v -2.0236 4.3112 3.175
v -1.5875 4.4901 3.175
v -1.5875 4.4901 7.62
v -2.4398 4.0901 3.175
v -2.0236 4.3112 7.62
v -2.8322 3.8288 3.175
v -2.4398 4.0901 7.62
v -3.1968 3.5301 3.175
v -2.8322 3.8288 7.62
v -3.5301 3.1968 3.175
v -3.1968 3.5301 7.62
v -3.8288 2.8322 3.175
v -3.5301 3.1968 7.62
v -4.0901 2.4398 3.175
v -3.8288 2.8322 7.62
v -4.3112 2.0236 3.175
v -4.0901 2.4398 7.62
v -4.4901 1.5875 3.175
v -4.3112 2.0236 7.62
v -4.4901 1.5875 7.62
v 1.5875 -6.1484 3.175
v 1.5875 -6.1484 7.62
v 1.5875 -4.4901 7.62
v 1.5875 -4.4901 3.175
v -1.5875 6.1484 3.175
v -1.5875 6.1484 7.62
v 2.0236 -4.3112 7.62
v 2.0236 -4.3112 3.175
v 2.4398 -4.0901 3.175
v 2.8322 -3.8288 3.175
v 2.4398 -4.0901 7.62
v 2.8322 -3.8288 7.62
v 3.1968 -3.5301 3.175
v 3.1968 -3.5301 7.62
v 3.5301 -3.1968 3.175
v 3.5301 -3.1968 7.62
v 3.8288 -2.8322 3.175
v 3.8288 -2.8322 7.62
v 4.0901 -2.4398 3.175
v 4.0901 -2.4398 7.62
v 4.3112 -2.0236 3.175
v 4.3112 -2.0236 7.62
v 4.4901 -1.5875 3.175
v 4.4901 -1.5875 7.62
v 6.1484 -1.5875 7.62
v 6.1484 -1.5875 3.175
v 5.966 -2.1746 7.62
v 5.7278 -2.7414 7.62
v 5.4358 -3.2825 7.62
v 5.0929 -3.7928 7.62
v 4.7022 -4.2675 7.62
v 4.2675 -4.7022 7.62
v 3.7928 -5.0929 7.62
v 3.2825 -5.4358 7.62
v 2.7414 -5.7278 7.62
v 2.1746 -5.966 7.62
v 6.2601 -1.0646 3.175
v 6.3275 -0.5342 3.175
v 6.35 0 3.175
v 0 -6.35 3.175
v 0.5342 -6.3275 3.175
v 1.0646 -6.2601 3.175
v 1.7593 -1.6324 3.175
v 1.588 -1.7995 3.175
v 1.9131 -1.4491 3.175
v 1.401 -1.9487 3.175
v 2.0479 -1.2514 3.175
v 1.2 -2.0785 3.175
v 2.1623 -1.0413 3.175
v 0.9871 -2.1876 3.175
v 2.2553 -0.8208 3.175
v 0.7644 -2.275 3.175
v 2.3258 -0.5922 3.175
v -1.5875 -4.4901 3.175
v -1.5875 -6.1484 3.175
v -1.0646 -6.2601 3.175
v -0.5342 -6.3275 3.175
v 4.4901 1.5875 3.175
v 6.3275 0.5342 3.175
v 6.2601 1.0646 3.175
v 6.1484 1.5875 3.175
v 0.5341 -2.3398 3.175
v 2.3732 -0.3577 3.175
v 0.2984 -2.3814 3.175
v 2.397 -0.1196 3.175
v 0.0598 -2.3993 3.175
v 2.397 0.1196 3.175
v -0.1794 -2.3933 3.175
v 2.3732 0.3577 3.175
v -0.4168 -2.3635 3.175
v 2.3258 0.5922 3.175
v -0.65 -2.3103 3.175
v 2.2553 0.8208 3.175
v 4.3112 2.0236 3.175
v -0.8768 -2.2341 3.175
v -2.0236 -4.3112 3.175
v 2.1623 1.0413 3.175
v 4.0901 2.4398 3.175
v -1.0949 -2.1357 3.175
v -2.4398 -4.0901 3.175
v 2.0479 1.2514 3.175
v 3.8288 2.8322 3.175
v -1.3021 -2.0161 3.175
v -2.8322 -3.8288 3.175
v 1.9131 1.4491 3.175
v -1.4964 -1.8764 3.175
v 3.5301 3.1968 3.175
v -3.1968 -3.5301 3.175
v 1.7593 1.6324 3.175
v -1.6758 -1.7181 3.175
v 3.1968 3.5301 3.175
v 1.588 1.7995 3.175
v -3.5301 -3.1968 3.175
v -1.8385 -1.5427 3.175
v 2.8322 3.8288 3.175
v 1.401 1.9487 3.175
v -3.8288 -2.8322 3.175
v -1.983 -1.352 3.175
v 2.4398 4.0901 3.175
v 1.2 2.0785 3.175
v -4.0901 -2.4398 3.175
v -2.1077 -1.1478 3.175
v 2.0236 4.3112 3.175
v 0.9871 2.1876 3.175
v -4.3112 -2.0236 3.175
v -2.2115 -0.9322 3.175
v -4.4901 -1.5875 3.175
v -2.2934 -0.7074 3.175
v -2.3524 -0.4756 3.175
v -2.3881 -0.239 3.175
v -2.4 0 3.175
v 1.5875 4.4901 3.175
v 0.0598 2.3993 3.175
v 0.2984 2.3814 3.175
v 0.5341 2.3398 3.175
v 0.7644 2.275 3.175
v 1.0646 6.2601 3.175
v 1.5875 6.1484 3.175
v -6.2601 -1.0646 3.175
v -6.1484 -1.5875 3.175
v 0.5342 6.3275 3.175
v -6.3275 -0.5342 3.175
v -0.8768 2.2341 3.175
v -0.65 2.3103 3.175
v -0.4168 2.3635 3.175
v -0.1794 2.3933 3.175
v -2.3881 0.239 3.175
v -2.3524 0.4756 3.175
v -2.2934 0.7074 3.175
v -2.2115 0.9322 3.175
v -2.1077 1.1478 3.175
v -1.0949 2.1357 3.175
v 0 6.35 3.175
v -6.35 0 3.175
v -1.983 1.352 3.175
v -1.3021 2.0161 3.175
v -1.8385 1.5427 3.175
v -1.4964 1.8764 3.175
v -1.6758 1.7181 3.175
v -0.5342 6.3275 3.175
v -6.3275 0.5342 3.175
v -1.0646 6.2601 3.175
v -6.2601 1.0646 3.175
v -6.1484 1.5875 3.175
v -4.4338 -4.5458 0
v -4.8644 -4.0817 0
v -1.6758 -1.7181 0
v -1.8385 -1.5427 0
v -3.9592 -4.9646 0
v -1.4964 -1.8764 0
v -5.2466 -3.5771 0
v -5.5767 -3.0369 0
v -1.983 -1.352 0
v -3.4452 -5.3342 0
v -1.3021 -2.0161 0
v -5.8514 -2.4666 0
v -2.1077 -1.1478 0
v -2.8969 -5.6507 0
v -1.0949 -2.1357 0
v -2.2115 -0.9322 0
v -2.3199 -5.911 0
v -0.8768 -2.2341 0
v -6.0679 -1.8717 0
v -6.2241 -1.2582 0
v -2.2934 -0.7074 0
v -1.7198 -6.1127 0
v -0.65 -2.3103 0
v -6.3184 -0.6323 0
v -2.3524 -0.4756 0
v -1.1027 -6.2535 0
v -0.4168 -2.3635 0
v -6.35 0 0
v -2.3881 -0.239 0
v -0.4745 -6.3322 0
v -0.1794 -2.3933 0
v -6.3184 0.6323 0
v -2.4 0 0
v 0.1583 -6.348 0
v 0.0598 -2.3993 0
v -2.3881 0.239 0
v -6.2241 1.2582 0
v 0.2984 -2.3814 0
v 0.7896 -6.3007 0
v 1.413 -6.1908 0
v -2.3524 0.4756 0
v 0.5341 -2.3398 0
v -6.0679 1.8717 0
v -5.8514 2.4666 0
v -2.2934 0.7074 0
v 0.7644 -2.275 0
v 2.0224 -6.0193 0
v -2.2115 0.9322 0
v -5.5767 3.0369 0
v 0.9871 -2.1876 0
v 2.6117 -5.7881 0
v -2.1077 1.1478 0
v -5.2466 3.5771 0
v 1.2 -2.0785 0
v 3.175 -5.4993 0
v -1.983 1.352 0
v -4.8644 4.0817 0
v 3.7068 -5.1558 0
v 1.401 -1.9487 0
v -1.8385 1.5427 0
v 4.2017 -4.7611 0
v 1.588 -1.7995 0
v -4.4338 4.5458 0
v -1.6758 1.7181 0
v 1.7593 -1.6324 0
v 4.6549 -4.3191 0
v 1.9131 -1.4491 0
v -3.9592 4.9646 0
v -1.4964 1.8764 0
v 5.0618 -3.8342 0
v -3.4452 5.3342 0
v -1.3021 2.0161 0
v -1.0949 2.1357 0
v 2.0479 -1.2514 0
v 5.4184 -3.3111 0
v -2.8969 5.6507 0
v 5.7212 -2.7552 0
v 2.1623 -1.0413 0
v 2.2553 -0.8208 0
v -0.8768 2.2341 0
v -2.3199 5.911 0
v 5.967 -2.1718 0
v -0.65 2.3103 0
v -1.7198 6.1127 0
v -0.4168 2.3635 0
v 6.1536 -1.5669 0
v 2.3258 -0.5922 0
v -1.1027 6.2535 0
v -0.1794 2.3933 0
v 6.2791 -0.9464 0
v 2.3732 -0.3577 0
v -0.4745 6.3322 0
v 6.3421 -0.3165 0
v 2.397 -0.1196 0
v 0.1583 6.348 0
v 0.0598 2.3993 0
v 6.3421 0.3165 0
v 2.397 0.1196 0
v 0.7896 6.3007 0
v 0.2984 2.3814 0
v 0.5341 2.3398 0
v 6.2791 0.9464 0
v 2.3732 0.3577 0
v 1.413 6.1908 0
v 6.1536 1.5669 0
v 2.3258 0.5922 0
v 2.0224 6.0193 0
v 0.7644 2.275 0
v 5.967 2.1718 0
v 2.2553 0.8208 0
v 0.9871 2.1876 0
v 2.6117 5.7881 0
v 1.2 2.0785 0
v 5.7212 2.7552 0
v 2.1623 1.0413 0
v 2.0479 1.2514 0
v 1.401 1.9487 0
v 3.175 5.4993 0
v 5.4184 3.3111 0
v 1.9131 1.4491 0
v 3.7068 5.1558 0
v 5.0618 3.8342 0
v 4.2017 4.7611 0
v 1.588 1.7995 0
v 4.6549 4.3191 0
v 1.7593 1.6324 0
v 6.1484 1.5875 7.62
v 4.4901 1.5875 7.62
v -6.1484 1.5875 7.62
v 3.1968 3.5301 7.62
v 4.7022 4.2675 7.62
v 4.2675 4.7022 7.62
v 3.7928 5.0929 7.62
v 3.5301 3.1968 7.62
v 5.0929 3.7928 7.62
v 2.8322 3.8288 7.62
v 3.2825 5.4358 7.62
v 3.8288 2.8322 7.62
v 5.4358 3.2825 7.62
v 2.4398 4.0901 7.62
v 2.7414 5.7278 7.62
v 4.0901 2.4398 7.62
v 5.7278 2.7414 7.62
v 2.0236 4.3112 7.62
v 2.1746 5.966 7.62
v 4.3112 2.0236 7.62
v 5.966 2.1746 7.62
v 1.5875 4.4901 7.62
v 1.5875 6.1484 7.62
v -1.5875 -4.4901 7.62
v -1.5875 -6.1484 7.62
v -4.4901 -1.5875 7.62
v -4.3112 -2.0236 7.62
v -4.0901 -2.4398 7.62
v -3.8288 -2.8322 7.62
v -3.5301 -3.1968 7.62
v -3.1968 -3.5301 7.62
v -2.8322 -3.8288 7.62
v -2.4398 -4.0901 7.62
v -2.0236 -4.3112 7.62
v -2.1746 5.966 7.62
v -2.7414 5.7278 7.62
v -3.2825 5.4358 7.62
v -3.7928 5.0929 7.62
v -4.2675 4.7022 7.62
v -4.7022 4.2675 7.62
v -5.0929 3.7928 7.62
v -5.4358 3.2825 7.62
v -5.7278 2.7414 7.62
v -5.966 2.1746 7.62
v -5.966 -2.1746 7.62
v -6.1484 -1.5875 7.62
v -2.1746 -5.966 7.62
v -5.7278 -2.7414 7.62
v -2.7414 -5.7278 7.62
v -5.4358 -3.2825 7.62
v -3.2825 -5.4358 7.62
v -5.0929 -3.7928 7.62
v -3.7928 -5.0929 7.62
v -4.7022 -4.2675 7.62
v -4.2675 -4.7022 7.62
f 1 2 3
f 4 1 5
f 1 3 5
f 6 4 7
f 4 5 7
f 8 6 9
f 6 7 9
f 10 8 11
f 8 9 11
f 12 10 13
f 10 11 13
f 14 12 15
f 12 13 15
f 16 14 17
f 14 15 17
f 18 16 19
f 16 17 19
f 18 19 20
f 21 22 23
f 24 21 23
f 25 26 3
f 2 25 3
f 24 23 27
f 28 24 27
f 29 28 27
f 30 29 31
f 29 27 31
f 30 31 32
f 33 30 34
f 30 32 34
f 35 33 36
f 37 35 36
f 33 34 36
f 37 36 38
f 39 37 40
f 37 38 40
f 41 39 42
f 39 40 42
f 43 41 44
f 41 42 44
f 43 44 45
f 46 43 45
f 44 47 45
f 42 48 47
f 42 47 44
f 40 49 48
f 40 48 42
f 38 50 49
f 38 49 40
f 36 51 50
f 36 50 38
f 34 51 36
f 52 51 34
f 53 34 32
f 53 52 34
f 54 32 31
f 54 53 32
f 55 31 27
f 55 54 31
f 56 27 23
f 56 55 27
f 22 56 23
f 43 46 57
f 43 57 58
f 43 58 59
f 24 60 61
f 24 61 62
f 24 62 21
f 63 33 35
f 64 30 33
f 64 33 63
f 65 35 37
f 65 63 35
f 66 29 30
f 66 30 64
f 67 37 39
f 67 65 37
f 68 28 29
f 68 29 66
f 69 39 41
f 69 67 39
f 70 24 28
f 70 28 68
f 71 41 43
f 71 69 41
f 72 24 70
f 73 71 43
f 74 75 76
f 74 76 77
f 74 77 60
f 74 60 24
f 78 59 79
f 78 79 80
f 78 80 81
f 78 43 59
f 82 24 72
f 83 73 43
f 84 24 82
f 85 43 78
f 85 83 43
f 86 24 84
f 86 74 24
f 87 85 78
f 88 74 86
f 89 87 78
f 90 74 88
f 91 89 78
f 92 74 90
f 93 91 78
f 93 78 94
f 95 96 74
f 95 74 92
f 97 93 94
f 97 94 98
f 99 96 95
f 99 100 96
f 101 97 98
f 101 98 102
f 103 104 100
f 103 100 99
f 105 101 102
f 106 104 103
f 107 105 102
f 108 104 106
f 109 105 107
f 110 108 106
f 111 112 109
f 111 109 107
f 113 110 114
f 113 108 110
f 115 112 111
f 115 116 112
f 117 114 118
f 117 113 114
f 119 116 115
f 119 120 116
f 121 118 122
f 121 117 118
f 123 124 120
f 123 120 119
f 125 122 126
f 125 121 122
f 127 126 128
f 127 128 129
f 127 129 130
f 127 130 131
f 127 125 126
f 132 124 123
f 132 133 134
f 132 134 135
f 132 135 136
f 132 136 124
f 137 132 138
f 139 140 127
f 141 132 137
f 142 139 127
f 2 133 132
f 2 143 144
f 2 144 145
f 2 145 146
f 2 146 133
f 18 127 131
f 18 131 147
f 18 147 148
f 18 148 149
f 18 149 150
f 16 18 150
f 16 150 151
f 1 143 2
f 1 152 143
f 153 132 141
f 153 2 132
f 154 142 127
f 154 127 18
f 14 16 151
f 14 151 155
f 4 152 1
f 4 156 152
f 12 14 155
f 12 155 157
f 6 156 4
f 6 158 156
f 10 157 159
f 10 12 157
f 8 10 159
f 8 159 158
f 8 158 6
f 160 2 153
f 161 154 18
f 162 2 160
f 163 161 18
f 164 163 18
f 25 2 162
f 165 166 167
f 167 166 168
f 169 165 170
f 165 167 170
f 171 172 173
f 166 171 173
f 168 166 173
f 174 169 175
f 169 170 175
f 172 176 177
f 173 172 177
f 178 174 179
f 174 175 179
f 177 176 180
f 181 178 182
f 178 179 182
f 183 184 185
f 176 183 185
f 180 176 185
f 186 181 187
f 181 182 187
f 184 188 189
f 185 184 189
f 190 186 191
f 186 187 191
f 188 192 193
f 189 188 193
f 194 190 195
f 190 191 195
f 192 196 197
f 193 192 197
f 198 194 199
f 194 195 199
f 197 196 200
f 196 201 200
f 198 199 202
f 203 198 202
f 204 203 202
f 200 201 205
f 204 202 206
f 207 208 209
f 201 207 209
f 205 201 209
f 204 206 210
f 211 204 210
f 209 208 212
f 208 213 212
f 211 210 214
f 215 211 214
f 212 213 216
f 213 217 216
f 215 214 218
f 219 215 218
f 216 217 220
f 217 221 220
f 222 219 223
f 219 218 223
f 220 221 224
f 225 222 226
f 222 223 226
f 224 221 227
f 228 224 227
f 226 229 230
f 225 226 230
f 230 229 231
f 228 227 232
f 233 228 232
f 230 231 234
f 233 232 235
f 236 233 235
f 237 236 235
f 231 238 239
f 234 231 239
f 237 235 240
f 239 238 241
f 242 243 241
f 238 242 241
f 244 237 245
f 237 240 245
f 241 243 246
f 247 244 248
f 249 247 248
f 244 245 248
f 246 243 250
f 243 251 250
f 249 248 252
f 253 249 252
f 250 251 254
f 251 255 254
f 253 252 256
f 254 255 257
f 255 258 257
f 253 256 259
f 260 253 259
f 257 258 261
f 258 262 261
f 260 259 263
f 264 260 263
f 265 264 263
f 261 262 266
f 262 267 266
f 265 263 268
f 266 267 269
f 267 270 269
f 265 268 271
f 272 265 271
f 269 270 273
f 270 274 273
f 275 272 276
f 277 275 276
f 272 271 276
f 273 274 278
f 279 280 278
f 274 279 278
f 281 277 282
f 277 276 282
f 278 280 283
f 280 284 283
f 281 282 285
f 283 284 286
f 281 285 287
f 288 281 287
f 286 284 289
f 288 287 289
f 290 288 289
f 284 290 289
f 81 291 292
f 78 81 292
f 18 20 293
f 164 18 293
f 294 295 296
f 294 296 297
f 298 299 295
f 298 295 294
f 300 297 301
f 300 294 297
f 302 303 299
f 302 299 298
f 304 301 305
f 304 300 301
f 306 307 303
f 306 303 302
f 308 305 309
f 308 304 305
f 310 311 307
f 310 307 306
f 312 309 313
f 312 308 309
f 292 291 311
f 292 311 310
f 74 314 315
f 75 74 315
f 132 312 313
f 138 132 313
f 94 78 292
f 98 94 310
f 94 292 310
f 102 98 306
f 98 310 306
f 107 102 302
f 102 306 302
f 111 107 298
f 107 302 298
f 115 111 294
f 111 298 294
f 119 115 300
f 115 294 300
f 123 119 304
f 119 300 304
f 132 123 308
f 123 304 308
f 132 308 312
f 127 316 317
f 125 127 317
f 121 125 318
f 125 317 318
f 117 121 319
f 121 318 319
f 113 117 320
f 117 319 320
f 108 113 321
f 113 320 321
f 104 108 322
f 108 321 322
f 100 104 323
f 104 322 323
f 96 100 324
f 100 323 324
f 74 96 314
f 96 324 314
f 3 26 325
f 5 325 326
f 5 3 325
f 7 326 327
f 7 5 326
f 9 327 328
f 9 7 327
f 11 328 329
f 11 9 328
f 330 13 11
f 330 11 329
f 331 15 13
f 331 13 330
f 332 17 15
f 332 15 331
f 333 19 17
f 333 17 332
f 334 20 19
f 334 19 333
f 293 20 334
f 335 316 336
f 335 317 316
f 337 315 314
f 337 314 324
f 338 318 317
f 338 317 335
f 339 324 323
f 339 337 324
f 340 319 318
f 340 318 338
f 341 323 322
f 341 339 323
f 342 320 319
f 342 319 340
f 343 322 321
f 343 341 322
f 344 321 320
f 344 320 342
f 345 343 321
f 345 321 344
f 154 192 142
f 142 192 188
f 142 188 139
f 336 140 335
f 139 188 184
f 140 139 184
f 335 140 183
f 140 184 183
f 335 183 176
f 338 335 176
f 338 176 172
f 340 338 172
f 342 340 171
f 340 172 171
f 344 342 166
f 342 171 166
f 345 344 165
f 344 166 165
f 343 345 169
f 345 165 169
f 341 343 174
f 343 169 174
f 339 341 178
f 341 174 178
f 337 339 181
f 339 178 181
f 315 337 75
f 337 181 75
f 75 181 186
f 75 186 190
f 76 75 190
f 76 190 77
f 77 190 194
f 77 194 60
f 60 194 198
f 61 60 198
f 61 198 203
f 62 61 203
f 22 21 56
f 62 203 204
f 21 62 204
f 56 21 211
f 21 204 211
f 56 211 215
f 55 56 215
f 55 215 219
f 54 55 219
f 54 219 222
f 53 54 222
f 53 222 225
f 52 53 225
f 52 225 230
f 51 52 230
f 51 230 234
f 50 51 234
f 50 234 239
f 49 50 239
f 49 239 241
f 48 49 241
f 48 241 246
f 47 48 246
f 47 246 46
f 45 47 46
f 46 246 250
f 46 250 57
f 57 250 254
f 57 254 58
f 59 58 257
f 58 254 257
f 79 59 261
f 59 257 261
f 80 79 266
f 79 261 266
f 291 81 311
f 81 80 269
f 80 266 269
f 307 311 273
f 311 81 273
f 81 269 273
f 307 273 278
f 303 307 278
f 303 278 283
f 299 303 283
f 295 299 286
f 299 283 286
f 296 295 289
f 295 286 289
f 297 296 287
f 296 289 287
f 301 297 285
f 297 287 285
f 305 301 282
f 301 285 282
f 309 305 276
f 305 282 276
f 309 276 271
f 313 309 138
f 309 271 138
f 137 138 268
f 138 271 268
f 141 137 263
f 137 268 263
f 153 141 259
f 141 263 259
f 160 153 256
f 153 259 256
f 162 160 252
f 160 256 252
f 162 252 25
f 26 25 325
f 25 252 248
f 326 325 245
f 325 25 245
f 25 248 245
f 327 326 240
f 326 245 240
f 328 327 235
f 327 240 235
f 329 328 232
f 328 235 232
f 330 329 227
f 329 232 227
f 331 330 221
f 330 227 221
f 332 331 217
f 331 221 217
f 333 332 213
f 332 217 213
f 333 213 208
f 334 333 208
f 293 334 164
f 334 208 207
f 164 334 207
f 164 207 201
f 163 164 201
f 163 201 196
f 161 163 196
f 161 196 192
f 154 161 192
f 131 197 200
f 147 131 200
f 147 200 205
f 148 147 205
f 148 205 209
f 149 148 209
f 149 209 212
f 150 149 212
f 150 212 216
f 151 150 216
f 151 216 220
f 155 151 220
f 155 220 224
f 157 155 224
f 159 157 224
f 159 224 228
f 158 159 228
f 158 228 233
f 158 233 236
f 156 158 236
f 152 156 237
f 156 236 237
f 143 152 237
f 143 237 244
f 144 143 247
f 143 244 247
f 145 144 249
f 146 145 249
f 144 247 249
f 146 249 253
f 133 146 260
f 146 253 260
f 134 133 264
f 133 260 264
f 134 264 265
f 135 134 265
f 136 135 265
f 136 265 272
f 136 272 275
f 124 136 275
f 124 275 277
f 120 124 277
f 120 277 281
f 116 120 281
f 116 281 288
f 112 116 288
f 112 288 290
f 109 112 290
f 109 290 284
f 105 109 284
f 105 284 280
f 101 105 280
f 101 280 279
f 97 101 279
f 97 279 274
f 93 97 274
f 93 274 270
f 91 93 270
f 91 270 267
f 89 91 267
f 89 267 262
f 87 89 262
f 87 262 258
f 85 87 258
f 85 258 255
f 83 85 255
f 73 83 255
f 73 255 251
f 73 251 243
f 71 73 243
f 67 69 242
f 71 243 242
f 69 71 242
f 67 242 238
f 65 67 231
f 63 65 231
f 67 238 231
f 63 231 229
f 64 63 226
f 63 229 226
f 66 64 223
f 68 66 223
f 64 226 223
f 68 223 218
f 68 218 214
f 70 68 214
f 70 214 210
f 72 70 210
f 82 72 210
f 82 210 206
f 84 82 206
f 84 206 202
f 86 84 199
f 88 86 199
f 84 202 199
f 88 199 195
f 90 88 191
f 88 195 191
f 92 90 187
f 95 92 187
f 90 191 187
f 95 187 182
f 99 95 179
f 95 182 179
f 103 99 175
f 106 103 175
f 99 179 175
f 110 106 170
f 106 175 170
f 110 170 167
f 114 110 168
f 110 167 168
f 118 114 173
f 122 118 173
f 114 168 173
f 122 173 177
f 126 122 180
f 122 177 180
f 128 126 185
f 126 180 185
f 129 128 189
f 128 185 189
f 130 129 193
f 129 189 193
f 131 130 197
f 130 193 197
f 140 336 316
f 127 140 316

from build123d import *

# Parameters (mm, degrees)
SKETCH2_R            = 6.35
SKETCH2_R_2          = 4.7625
SKETCH2_R_3          = 3.5000057
BOSS_EXTRUDE1_DEPTH  = 7.62
SKETCH3_R            = 4.7625
SKETCH3_R_2          = 3.5000057
CUT_EXTRUDE1_DEPTH   = 4.445
M4_CLEARANCE_HOLE1_D = 4.8
CUT_EXTRUDE2_DEPTH   = 4.445
CIRPATTERN1_COUNT    = 4


with BuildPart() as part:
    # Sketch2 → Boss-Extrude1 (new body)
    # profile 1 of 3: a face of its own
    with BuildSketch(Plane.XY):
        with Locations(Location((0, 0, 0), (0, 0, 180))):
            Circle(SKETCH2_R)
        Circle(SKETCH2_R_2, mode=Mode.SUBTRACT)
    # profile 2 of 3: a face of its own
    with BuildSketch(Plane.XY):
        Circle(SKETCH2_R_2)
        Circle(SKETCH2_R_3, mode=Mode.SUBTRACT)
    # profile 3 of 3: a face of its own
    with BuildSketch(Plane.XY):
        Circle(SKETCH2_R_3)
    extrude(amount=BOSS_EXTRUDE1_DEPTH)

    # Sketch3 → Cut-Extrude1 (cut)
    # profile 1 of 2: a face of its own
    with BuildSketch(Plane.XY.offset(7.62)):
        Circle(SKETCH3_R)
        Circle(SKETCH3_R_2, mode=Mode.SUBTRACT)
    # profile 2 of 2: a face of its own
    with BuildSketch(Plane.XY.offset(7.62)):
        Circle(SKETCH3_R_2)
    extrude(amount=-CUT_EXTRUDE1_DEPTH, mode=Mode.SUBTRACT)

    # M4 Clearance Hole1 (through all)
    with Locations(Plane.XY.offset(3.175)):
        with Locations((0, 0)):
            Hole(M4_CLEARANCE_HOLE1_D / 2)

    # Sketch6 → Cut-Extrude2 (cut)
    with BuildSketch(Plane.XY.offset(7.62)):
        with BuildLine():
            ThreePointArc((1.5875, 6.148361062), (0, 6.35), (-1.5875, 6.148361062))
            Line((-1.5875, 6.148361062), (-1.5875, 4.490128061))
            ThreePointArc((-1.5875, 4.490128061), (0, 4.7625), (1.5875, 4.490128061))
            Line((1.5875, 4.490128061), (1.5875, 6.148361062))
        make_face()
    cut_extrude2 = extrude(amount=-CUT_EXTRUDE2_DEPTH, mode=Mode.SUBTRACT)

    # CirPattern1: Cut-Extrude2 ×4 about axis
    cirpattern1_axis = Axis((0, 0, 0), (0, 0, 1))
    for i in range(1, CIRPATTERN1_COUNT):
        add(cut_extrude2.rotate(cirpattern1_axis, i * 360 / CIRPATTERN1_COUNT), mode=Mode.SUBTRACT)


solid = part.part
